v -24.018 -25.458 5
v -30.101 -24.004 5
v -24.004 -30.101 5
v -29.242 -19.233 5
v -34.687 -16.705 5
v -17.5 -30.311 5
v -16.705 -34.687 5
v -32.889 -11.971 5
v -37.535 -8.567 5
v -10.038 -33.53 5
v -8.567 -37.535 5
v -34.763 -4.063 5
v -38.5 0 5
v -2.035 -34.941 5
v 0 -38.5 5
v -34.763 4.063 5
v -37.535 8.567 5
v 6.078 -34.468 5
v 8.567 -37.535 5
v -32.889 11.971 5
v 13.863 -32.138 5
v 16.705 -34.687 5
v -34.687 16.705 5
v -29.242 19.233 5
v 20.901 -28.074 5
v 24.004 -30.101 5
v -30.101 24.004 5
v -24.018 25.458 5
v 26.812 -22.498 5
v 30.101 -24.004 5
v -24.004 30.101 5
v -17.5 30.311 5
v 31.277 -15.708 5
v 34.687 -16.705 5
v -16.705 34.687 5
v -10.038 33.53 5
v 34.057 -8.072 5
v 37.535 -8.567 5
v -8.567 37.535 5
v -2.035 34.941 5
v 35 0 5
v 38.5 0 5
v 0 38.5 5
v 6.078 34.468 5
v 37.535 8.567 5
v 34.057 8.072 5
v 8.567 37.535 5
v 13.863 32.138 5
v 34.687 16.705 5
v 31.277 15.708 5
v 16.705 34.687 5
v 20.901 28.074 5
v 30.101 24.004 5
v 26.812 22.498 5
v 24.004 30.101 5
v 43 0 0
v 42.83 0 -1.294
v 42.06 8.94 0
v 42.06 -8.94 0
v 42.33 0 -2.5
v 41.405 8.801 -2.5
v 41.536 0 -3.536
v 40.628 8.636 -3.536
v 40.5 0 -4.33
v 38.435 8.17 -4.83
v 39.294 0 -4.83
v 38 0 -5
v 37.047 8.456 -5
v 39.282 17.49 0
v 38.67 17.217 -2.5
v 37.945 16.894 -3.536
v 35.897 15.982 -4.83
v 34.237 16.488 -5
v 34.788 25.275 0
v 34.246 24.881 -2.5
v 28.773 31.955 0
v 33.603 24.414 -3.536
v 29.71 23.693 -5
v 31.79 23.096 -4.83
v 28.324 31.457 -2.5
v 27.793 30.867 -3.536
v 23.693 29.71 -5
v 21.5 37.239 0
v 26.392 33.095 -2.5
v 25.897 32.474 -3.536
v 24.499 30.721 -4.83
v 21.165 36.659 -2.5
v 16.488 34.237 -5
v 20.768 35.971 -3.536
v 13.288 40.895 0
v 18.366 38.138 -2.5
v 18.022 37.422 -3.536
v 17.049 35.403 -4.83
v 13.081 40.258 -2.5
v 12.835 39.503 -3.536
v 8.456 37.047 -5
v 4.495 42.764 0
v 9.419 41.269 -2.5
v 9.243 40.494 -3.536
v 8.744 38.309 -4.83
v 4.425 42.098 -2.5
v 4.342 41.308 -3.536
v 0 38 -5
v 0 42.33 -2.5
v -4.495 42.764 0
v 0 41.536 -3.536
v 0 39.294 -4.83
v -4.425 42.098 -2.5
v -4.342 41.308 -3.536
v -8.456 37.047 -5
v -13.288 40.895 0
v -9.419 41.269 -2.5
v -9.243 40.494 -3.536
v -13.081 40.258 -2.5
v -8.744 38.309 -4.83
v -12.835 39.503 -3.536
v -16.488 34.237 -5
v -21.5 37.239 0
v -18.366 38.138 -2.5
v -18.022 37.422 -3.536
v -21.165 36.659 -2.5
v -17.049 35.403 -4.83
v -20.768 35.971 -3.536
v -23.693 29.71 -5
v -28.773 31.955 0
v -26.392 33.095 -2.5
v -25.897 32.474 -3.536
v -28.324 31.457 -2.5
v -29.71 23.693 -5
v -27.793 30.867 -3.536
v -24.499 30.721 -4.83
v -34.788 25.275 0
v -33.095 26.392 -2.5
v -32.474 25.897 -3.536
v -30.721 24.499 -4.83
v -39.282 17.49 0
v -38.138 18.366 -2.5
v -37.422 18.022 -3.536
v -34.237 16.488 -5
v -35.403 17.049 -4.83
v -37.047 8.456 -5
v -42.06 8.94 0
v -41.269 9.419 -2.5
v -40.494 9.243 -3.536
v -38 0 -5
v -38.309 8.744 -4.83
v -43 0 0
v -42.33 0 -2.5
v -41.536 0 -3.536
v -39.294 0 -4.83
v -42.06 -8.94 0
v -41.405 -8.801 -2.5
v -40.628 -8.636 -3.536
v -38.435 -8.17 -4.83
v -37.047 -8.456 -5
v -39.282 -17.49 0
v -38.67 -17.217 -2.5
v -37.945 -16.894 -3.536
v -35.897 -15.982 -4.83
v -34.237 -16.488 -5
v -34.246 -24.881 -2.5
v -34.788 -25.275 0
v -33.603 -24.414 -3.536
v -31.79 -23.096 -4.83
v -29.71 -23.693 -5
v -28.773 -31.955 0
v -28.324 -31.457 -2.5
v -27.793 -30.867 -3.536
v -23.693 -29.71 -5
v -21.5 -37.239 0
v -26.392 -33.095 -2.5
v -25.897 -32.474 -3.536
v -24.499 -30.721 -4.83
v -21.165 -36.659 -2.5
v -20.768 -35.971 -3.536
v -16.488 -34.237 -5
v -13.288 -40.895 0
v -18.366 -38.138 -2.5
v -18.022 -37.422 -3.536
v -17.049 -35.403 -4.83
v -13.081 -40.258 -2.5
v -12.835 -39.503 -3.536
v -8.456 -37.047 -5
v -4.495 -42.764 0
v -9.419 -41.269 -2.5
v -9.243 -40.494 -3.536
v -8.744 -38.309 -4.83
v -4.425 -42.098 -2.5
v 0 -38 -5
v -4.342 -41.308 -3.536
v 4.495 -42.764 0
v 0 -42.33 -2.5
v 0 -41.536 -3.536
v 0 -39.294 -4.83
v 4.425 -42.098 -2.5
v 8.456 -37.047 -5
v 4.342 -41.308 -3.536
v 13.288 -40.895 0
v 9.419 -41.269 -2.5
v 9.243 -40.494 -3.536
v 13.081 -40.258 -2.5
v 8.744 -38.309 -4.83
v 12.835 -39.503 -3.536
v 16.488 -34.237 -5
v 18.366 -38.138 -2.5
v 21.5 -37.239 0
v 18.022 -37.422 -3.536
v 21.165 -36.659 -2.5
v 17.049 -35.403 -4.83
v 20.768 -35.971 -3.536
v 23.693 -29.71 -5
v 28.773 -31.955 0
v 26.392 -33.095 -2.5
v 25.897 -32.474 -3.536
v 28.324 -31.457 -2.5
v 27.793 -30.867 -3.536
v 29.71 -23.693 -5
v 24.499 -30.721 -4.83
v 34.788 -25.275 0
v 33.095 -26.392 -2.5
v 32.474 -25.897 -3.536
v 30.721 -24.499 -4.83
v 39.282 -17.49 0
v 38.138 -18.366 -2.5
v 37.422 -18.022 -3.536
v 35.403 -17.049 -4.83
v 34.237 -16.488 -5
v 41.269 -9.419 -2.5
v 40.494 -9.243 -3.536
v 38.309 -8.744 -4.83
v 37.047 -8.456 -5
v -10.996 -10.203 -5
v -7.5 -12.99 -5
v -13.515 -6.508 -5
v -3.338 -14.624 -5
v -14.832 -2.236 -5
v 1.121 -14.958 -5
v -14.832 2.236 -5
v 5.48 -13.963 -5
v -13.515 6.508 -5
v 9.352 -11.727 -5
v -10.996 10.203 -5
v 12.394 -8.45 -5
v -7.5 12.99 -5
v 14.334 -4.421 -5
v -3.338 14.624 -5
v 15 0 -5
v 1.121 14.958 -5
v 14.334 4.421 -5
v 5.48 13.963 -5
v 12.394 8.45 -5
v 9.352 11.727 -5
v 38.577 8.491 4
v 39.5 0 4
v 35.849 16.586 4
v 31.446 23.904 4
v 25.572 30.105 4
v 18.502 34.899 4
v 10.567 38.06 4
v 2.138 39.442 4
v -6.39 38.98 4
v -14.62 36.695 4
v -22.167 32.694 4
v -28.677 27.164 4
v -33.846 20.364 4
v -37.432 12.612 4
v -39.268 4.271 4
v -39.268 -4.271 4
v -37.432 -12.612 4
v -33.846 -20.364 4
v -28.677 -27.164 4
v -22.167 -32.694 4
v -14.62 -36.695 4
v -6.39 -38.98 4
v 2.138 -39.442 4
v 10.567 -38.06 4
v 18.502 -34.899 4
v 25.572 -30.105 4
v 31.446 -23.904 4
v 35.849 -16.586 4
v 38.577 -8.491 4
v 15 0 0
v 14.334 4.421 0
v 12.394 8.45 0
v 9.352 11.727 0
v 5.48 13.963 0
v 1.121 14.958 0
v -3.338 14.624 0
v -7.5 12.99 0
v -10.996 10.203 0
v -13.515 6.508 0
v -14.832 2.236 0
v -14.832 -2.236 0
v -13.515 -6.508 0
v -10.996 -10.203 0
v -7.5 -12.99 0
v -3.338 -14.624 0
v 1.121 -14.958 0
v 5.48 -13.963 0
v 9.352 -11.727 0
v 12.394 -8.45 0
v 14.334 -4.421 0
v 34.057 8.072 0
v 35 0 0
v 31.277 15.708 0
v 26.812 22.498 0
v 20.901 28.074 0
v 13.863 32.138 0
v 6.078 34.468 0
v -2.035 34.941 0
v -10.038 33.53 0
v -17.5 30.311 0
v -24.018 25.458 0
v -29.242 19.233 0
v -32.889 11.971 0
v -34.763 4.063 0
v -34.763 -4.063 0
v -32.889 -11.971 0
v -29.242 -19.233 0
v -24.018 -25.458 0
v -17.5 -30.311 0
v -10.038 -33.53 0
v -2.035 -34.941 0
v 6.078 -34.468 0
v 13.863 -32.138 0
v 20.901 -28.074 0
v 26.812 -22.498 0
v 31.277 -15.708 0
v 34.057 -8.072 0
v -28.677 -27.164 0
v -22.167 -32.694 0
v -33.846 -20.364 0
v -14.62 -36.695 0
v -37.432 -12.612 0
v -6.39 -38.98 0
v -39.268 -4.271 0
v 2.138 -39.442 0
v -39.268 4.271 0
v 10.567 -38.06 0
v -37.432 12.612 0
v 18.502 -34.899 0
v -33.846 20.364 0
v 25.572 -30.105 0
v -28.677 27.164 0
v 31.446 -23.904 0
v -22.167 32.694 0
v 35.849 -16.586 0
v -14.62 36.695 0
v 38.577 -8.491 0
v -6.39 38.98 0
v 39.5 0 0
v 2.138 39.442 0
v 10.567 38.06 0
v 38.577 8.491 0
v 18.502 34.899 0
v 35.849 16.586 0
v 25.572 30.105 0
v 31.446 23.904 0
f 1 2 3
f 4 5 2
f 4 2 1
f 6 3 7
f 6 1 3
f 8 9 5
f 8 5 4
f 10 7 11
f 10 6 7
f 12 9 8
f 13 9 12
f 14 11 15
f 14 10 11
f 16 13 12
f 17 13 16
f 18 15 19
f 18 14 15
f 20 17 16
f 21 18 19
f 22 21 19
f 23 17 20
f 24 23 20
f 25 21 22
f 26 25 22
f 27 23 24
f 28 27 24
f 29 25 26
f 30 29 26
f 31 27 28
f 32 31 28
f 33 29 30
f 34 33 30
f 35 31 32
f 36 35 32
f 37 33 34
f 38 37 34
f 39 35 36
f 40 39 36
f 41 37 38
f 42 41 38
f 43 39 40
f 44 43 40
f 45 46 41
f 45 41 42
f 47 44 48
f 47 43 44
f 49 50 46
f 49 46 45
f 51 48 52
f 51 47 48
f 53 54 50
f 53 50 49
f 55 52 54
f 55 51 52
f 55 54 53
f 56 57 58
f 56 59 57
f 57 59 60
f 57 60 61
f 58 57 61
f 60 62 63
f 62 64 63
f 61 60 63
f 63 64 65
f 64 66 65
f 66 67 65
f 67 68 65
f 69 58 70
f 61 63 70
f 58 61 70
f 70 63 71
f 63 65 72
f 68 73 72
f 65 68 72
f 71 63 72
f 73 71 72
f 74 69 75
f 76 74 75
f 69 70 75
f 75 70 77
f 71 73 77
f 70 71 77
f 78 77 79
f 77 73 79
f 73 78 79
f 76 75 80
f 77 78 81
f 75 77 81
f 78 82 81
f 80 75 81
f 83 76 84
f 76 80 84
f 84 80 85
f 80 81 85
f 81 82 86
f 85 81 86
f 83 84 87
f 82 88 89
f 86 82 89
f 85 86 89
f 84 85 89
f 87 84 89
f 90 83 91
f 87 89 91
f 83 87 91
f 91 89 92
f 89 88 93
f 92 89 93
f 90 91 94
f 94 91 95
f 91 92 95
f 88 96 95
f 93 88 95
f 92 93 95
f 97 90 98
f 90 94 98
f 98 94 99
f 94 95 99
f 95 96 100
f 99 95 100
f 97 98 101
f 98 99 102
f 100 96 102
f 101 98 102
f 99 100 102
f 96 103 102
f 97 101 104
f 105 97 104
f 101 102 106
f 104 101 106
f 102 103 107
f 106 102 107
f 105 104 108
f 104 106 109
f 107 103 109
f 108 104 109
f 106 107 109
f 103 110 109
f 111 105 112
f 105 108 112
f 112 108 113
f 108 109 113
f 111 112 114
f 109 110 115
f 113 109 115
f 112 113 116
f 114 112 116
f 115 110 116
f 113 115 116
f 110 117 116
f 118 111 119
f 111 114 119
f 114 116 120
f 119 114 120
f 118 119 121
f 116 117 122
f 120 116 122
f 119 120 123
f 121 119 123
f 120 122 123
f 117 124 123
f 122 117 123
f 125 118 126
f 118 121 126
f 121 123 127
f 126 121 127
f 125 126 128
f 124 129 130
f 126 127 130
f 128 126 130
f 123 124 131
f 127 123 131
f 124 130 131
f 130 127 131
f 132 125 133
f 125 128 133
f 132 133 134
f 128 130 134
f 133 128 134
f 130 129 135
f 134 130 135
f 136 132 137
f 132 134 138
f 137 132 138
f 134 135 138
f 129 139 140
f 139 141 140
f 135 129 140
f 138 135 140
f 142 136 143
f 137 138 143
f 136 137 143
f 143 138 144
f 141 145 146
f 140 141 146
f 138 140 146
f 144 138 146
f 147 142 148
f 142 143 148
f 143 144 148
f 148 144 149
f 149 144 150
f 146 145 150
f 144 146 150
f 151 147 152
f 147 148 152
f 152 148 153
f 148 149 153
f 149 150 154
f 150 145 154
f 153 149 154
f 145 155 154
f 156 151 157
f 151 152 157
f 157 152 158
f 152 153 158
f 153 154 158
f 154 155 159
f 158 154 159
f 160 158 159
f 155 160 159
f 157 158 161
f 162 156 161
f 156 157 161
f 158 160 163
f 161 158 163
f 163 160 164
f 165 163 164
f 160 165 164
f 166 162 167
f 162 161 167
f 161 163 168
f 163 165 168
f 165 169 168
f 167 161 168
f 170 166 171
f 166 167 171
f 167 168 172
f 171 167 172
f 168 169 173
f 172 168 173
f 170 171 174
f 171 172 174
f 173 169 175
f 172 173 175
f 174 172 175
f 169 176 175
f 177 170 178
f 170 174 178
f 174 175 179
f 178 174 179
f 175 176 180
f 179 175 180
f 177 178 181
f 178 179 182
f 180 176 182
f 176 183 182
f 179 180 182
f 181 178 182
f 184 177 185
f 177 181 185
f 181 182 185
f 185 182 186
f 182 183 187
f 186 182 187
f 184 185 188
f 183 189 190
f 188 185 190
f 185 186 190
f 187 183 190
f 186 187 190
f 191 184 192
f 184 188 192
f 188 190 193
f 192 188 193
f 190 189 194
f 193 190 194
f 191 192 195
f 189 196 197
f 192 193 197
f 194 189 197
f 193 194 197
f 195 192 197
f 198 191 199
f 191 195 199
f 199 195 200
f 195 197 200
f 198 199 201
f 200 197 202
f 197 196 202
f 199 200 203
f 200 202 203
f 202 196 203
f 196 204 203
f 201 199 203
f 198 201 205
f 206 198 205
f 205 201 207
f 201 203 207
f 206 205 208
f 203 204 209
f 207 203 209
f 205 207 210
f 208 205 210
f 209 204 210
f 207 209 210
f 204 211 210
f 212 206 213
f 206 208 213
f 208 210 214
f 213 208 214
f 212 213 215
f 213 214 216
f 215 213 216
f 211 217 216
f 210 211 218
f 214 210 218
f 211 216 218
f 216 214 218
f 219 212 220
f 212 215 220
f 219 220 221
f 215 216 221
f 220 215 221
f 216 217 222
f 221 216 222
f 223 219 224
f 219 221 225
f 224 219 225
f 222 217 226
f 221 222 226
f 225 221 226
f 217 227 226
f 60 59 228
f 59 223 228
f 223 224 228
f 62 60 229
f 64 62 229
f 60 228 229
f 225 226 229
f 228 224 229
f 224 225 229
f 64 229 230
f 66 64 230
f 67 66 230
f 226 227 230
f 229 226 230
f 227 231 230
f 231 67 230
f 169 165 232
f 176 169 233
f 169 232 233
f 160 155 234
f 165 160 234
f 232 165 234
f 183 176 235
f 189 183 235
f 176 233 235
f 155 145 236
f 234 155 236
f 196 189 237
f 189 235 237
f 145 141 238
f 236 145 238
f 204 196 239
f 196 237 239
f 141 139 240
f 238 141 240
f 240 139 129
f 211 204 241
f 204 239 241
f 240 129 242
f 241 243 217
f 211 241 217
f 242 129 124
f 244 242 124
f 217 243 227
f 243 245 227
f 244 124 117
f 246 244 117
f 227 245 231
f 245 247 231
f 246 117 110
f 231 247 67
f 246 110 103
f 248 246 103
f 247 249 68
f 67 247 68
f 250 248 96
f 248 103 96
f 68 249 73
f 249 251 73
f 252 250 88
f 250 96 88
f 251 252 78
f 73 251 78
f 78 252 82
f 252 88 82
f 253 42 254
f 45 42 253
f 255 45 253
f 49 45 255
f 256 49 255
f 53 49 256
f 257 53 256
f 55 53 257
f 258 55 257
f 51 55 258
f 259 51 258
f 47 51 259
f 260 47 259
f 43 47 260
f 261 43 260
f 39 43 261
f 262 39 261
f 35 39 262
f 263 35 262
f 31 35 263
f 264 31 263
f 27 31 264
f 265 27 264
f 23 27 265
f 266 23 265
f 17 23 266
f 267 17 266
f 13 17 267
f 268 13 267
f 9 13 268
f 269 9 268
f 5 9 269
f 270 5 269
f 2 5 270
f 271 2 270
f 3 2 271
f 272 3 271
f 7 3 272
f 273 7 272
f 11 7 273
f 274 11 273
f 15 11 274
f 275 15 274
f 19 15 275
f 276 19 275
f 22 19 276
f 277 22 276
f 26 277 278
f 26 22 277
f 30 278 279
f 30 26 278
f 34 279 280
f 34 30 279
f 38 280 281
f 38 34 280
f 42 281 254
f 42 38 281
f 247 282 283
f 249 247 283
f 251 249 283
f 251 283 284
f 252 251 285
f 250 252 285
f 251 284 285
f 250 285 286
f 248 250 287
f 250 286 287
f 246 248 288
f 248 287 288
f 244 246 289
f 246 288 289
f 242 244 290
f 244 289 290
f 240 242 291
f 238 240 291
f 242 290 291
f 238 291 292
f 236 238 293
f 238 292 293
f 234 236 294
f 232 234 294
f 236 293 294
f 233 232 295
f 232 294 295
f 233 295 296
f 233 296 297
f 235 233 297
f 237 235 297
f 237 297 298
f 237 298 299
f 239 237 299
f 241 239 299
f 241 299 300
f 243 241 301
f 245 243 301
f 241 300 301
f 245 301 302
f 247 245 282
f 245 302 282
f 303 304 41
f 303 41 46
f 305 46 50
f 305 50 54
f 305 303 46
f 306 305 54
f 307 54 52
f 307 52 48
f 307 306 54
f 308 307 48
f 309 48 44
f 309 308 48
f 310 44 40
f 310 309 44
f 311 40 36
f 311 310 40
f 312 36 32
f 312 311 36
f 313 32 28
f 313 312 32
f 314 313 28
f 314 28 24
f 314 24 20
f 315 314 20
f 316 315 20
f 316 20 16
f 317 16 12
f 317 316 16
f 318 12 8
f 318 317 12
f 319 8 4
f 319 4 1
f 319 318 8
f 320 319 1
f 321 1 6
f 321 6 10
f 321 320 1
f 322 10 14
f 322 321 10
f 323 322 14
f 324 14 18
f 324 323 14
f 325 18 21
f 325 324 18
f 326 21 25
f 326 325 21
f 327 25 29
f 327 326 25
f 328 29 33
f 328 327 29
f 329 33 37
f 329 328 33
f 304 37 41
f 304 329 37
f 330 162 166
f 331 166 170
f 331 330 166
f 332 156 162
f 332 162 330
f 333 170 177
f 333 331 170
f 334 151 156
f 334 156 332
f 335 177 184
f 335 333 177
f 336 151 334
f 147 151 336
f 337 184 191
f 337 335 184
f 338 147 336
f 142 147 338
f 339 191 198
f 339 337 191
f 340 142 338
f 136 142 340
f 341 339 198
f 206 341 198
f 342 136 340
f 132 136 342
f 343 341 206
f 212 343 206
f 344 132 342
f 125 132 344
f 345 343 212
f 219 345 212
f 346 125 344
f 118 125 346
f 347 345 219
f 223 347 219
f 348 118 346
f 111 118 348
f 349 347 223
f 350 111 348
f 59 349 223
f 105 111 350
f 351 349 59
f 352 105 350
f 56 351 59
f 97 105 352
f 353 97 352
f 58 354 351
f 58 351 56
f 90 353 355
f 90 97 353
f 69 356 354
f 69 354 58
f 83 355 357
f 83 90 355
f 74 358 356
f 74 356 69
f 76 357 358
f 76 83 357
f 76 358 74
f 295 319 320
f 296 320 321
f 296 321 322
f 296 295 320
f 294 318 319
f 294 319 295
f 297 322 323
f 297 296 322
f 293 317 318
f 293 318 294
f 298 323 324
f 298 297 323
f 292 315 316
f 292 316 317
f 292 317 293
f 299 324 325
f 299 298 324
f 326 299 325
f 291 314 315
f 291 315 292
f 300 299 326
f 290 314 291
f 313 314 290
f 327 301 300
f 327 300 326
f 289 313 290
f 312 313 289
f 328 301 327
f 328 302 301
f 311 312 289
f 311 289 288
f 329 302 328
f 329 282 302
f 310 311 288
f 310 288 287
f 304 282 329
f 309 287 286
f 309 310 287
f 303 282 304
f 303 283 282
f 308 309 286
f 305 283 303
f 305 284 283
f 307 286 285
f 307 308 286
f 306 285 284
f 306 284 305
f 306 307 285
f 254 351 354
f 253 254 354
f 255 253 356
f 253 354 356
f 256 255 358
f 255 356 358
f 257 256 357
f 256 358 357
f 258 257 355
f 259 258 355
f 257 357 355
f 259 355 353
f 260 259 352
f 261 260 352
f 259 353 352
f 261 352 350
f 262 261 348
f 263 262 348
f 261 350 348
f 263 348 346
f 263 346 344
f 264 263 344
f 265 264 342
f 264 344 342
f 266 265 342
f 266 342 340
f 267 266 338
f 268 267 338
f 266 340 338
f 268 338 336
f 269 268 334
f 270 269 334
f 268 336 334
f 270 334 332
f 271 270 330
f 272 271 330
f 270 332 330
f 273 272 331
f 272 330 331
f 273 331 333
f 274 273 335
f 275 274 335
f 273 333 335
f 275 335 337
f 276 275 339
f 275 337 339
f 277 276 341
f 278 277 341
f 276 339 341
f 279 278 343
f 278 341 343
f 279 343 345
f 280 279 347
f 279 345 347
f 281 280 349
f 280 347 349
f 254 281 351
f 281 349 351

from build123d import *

# Parameters (mm, degrees)
F0_R     = 39.5
F0_R_2   = 35
F1_DEPTH = 5
F0_R_3   = 43
F0_R_4   = 15
F2_DEPTH = 5
F3_R     = 4.99999
F4_SIZE  = 1


# Not quite as in the source:
# - a fillet or chamfer is up to 0.001 mm smaller than in the source, because OpenCascade refuses the exact size


with BuildPart() as f1:
    # F0 (on Top) → F1 (new body)
    with BuildSketch(Plane.XY):
        Circle(F0_R)
        Circle(F0_R_2, mode=Mode.SUBTRACT)
    extrude(amount=F1_DEPTH)

    # F0 (on Top) → F2 (join)
    with BuildSketch(Plane.XY):
        Circle(F0_R_3)
        Circle(F0_R, mode=Mode.SUBTRACT)
        Circle(F0_R)
        Circle(F0_R_2, mode=Mode.SUBTRACT)
        Circle(F0_R_2)
        Circle(F0_R_4, mode=Mode.SUBTRACT)
    extrude(amount=-F2_DEPTH)

    # F3 (radius 5 in the source; OpenCascade refuses exactly that, so slightly less here)
    f3_edges = [f1.edges().sort_by_distance(p)[0] for p in [
        (-43, 0, -5),
    ]]
    fillet(f3_edges, radius=F3_R)

    # F4
    f4_edges = [f1.edges().sort_by_distance(p)[0] for p in [
        (-39.5, 0, 5),
    ]]
    chamfer(f4_edges, length=F4_SIZE)


solid = f1.part
